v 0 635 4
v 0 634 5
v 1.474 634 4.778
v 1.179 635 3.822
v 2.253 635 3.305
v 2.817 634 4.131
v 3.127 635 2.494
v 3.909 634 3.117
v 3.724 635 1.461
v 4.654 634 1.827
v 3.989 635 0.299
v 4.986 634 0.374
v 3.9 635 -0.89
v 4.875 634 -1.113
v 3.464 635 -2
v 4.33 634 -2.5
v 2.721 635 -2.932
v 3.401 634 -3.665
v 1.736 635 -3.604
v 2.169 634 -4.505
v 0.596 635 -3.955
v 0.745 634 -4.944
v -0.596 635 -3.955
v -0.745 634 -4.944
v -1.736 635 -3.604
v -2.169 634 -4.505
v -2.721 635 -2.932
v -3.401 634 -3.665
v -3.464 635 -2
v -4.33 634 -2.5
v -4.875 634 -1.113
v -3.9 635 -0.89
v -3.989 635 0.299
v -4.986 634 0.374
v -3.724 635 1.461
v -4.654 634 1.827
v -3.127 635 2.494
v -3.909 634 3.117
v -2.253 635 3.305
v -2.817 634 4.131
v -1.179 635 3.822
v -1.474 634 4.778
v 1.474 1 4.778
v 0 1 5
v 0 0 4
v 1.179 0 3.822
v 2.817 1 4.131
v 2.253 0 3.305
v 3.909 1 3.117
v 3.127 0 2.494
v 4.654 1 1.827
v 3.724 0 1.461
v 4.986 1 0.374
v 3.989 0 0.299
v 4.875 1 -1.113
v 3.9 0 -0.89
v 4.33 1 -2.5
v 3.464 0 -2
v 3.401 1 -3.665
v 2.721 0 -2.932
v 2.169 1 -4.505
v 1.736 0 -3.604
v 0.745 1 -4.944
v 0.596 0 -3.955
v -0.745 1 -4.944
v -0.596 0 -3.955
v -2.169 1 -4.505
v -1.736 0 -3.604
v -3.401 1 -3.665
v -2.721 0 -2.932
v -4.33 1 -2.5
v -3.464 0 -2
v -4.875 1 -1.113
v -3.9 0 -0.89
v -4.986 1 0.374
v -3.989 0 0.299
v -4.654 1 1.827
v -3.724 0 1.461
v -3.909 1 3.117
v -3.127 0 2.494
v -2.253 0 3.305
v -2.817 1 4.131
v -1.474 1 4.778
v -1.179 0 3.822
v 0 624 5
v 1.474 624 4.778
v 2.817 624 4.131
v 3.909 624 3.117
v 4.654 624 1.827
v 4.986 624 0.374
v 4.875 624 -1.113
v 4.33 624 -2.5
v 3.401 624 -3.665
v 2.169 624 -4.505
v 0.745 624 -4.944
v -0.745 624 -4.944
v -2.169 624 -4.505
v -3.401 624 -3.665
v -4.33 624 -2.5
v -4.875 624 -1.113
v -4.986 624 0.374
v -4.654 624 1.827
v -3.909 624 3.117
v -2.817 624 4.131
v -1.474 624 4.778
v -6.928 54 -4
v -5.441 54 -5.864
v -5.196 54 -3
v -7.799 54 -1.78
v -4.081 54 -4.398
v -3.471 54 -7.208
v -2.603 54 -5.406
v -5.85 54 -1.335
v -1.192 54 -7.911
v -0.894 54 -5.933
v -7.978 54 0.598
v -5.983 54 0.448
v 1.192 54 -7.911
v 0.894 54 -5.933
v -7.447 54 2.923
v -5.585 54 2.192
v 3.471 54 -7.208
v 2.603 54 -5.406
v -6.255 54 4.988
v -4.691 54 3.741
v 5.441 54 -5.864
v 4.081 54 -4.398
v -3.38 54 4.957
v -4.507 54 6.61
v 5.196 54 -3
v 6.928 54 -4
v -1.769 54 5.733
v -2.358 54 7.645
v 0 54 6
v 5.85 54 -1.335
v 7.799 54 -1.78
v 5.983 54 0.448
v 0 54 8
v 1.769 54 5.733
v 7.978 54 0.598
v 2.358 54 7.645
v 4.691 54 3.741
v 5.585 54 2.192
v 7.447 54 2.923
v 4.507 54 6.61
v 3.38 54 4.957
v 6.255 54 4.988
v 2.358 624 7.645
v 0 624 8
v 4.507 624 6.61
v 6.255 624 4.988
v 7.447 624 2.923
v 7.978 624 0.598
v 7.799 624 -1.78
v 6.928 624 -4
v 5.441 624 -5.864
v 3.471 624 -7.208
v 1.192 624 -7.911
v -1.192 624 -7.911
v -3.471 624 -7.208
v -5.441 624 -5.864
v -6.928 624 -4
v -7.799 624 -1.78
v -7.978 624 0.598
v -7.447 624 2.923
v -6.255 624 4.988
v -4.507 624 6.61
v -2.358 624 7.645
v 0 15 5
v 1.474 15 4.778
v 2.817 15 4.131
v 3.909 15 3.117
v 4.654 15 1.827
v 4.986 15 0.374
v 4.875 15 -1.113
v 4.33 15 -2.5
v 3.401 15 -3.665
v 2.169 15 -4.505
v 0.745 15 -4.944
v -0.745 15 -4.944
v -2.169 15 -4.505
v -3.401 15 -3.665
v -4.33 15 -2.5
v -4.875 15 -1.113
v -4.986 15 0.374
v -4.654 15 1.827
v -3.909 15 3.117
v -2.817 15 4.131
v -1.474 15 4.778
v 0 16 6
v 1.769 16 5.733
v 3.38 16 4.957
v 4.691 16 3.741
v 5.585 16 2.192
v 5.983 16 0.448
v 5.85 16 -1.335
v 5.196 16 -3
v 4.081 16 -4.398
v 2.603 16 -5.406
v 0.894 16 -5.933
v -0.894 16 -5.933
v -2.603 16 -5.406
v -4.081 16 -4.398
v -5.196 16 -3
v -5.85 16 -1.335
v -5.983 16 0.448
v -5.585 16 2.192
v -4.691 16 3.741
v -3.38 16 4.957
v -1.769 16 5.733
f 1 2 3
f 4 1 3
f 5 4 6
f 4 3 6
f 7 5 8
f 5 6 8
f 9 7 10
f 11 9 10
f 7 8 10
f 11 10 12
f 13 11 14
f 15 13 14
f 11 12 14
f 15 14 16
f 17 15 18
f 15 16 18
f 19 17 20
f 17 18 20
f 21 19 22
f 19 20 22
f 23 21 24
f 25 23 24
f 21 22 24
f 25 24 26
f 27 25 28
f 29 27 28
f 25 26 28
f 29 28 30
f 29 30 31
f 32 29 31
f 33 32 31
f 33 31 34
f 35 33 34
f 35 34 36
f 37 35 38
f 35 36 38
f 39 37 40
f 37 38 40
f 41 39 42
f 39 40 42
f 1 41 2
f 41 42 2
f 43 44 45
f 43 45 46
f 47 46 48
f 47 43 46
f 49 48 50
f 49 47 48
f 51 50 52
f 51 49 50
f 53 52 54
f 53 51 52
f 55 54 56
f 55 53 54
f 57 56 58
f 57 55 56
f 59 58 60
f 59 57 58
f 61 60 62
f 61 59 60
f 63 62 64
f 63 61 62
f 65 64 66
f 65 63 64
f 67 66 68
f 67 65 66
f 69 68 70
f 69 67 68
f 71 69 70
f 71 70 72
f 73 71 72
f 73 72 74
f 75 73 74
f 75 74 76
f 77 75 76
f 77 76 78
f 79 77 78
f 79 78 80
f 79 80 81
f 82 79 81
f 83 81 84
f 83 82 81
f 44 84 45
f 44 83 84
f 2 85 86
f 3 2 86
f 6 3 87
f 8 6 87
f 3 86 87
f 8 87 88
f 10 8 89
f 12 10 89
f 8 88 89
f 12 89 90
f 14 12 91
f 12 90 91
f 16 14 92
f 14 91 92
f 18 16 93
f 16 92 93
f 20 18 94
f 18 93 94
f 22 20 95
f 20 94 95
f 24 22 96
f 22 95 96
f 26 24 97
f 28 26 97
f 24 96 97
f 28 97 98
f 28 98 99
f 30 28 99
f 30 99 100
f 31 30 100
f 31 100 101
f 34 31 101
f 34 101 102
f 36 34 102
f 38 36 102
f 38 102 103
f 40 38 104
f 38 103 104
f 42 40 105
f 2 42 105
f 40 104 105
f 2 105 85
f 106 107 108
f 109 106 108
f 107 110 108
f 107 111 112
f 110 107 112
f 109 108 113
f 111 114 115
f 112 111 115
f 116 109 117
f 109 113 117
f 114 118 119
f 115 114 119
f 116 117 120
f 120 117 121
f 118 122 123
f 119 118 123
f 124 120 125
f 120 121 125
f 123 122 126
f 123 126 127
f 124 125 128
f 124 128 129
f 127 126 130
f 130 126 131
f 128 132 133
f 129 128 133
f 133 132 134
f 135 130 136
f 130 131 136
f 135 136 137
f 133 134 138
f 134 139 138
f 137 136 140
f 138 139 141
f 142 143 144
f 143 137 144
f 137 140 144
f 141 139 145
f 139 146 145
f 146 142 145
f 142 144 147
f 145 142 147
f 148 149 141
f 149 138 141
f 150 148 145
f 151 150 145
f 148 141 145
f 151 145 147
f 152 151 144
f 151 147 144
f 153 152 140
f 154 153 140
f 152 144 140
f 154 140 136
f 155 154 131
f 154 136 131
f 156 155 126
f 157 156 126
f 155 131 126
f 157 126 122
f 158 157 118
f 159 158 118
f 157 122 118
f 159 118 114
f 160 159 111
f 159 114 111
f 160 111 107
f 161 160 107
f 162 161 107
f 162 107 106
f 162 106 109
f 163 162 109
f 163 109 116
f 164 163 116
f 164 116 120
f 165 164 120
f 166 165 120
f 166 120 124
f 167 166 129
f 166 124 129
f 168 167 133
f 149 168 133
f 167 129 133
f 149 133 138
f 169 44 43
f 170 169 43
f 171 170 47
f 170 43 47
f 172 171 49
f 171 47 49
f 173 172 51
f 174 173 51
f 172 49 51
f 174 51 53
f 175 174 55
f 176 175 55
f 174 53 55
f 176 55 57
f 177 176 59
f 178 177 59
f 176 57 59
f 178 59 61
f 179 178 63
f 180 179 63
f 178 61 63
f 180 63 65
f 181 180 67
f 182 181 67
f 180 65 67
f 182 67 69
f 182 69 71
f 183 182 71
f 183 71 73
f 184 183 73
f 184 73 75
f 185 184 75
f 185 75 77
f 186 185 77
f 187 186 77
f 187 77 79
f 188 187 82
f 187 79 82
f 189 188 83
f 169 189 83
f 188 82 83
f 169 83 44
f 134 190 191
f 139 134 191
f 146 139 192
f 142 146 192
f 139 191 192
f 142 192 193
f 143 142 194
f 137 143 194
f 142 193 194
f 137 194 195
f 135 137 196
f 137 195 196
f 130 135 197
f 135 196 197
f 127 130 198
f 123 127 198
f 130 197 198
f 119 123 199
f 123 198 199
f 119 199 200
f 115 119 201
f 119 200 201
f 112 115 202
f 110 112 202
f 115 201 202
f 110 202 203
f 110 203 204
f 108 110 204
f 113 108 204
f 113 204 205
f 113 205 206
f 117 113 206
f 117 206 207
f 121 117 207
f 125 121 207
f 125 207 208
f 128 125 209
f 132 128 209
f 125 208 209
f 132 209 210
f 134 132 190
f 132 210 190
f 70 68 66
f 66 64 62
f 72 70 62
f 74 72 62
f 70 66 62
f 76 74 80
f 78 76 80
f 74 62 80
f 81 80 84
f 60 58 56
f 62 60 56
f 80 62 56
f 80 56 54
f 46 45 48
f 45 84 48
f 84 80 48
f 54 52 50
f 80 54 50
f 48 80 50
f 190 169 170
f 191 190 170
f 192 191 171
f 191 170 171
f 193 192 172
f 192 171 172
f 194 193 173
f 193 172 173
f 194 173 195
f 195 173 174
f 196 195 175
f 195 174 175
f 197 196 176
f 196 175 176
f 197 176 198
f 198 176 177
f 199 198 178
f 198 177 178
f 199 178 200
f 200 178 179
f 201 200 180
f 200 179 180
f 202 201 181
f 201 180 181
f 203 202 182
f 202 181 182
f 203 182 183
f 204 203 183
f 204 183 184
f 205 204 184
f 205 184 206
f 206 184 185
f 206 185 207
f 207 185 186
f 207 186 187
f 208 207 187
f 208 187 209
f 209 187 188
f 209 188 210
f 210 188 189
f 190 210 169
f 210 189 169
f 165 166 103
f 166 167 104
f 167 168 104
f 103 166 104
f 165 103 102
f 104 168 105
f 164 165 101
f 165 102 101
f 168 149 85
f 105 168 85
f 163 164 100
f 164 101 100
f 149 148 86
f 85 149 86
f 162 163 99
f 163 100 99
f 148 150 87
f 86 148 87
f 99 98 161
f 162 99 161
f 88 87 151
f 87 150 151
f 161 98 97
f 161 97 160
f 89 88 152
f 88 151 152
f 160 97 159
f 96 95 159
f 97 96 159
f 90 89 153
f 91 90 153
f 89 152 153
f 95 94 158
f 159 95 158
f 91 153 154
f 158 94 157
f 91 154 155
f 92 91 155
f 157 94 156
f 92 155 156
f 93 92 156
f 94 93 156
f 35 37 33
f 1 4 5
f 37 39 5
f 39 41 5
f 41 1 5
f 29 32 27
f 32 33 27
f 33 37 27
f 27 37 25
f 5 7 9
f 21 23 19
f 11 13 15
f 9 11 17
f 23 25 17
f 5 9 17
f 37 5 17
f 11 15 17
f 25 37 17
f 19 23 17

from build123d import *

# Parameters (mm, degrees)
F2_SIZE = 0.99999


# Not quite as in the source:
# - a fillet or chamfer is up to 0.001 mm smaller than in the source, because OpenCascade refuses the exact size


with BuildPart() as f1:
    # F0 (on Right) → F1 (revolve)
    with BuildSketch(Plane.YZ):
        Polygon((0, 5), (0, 0), (635, 0), (635, 5), (624, 5), (624, 8), (54, 8), (54, 6), (15, 6), (15, 5), align=None)
    revolve(axis=Axis((0, 344.1624132916, 0), (0, 1, 0)))

    # F2 (size 1 in the source; OpenCascade refuses exactly that, so slightly less here)
    f2_edges = [f1.edges().sort_by_distance(p)[0] for p in [
        (0, 0, -5),
        (0, 15, -6),
        (0, 635, -5),
    ]]
    chamfer(f2_edges, length=F2_SIZE)


solid = f1.part
